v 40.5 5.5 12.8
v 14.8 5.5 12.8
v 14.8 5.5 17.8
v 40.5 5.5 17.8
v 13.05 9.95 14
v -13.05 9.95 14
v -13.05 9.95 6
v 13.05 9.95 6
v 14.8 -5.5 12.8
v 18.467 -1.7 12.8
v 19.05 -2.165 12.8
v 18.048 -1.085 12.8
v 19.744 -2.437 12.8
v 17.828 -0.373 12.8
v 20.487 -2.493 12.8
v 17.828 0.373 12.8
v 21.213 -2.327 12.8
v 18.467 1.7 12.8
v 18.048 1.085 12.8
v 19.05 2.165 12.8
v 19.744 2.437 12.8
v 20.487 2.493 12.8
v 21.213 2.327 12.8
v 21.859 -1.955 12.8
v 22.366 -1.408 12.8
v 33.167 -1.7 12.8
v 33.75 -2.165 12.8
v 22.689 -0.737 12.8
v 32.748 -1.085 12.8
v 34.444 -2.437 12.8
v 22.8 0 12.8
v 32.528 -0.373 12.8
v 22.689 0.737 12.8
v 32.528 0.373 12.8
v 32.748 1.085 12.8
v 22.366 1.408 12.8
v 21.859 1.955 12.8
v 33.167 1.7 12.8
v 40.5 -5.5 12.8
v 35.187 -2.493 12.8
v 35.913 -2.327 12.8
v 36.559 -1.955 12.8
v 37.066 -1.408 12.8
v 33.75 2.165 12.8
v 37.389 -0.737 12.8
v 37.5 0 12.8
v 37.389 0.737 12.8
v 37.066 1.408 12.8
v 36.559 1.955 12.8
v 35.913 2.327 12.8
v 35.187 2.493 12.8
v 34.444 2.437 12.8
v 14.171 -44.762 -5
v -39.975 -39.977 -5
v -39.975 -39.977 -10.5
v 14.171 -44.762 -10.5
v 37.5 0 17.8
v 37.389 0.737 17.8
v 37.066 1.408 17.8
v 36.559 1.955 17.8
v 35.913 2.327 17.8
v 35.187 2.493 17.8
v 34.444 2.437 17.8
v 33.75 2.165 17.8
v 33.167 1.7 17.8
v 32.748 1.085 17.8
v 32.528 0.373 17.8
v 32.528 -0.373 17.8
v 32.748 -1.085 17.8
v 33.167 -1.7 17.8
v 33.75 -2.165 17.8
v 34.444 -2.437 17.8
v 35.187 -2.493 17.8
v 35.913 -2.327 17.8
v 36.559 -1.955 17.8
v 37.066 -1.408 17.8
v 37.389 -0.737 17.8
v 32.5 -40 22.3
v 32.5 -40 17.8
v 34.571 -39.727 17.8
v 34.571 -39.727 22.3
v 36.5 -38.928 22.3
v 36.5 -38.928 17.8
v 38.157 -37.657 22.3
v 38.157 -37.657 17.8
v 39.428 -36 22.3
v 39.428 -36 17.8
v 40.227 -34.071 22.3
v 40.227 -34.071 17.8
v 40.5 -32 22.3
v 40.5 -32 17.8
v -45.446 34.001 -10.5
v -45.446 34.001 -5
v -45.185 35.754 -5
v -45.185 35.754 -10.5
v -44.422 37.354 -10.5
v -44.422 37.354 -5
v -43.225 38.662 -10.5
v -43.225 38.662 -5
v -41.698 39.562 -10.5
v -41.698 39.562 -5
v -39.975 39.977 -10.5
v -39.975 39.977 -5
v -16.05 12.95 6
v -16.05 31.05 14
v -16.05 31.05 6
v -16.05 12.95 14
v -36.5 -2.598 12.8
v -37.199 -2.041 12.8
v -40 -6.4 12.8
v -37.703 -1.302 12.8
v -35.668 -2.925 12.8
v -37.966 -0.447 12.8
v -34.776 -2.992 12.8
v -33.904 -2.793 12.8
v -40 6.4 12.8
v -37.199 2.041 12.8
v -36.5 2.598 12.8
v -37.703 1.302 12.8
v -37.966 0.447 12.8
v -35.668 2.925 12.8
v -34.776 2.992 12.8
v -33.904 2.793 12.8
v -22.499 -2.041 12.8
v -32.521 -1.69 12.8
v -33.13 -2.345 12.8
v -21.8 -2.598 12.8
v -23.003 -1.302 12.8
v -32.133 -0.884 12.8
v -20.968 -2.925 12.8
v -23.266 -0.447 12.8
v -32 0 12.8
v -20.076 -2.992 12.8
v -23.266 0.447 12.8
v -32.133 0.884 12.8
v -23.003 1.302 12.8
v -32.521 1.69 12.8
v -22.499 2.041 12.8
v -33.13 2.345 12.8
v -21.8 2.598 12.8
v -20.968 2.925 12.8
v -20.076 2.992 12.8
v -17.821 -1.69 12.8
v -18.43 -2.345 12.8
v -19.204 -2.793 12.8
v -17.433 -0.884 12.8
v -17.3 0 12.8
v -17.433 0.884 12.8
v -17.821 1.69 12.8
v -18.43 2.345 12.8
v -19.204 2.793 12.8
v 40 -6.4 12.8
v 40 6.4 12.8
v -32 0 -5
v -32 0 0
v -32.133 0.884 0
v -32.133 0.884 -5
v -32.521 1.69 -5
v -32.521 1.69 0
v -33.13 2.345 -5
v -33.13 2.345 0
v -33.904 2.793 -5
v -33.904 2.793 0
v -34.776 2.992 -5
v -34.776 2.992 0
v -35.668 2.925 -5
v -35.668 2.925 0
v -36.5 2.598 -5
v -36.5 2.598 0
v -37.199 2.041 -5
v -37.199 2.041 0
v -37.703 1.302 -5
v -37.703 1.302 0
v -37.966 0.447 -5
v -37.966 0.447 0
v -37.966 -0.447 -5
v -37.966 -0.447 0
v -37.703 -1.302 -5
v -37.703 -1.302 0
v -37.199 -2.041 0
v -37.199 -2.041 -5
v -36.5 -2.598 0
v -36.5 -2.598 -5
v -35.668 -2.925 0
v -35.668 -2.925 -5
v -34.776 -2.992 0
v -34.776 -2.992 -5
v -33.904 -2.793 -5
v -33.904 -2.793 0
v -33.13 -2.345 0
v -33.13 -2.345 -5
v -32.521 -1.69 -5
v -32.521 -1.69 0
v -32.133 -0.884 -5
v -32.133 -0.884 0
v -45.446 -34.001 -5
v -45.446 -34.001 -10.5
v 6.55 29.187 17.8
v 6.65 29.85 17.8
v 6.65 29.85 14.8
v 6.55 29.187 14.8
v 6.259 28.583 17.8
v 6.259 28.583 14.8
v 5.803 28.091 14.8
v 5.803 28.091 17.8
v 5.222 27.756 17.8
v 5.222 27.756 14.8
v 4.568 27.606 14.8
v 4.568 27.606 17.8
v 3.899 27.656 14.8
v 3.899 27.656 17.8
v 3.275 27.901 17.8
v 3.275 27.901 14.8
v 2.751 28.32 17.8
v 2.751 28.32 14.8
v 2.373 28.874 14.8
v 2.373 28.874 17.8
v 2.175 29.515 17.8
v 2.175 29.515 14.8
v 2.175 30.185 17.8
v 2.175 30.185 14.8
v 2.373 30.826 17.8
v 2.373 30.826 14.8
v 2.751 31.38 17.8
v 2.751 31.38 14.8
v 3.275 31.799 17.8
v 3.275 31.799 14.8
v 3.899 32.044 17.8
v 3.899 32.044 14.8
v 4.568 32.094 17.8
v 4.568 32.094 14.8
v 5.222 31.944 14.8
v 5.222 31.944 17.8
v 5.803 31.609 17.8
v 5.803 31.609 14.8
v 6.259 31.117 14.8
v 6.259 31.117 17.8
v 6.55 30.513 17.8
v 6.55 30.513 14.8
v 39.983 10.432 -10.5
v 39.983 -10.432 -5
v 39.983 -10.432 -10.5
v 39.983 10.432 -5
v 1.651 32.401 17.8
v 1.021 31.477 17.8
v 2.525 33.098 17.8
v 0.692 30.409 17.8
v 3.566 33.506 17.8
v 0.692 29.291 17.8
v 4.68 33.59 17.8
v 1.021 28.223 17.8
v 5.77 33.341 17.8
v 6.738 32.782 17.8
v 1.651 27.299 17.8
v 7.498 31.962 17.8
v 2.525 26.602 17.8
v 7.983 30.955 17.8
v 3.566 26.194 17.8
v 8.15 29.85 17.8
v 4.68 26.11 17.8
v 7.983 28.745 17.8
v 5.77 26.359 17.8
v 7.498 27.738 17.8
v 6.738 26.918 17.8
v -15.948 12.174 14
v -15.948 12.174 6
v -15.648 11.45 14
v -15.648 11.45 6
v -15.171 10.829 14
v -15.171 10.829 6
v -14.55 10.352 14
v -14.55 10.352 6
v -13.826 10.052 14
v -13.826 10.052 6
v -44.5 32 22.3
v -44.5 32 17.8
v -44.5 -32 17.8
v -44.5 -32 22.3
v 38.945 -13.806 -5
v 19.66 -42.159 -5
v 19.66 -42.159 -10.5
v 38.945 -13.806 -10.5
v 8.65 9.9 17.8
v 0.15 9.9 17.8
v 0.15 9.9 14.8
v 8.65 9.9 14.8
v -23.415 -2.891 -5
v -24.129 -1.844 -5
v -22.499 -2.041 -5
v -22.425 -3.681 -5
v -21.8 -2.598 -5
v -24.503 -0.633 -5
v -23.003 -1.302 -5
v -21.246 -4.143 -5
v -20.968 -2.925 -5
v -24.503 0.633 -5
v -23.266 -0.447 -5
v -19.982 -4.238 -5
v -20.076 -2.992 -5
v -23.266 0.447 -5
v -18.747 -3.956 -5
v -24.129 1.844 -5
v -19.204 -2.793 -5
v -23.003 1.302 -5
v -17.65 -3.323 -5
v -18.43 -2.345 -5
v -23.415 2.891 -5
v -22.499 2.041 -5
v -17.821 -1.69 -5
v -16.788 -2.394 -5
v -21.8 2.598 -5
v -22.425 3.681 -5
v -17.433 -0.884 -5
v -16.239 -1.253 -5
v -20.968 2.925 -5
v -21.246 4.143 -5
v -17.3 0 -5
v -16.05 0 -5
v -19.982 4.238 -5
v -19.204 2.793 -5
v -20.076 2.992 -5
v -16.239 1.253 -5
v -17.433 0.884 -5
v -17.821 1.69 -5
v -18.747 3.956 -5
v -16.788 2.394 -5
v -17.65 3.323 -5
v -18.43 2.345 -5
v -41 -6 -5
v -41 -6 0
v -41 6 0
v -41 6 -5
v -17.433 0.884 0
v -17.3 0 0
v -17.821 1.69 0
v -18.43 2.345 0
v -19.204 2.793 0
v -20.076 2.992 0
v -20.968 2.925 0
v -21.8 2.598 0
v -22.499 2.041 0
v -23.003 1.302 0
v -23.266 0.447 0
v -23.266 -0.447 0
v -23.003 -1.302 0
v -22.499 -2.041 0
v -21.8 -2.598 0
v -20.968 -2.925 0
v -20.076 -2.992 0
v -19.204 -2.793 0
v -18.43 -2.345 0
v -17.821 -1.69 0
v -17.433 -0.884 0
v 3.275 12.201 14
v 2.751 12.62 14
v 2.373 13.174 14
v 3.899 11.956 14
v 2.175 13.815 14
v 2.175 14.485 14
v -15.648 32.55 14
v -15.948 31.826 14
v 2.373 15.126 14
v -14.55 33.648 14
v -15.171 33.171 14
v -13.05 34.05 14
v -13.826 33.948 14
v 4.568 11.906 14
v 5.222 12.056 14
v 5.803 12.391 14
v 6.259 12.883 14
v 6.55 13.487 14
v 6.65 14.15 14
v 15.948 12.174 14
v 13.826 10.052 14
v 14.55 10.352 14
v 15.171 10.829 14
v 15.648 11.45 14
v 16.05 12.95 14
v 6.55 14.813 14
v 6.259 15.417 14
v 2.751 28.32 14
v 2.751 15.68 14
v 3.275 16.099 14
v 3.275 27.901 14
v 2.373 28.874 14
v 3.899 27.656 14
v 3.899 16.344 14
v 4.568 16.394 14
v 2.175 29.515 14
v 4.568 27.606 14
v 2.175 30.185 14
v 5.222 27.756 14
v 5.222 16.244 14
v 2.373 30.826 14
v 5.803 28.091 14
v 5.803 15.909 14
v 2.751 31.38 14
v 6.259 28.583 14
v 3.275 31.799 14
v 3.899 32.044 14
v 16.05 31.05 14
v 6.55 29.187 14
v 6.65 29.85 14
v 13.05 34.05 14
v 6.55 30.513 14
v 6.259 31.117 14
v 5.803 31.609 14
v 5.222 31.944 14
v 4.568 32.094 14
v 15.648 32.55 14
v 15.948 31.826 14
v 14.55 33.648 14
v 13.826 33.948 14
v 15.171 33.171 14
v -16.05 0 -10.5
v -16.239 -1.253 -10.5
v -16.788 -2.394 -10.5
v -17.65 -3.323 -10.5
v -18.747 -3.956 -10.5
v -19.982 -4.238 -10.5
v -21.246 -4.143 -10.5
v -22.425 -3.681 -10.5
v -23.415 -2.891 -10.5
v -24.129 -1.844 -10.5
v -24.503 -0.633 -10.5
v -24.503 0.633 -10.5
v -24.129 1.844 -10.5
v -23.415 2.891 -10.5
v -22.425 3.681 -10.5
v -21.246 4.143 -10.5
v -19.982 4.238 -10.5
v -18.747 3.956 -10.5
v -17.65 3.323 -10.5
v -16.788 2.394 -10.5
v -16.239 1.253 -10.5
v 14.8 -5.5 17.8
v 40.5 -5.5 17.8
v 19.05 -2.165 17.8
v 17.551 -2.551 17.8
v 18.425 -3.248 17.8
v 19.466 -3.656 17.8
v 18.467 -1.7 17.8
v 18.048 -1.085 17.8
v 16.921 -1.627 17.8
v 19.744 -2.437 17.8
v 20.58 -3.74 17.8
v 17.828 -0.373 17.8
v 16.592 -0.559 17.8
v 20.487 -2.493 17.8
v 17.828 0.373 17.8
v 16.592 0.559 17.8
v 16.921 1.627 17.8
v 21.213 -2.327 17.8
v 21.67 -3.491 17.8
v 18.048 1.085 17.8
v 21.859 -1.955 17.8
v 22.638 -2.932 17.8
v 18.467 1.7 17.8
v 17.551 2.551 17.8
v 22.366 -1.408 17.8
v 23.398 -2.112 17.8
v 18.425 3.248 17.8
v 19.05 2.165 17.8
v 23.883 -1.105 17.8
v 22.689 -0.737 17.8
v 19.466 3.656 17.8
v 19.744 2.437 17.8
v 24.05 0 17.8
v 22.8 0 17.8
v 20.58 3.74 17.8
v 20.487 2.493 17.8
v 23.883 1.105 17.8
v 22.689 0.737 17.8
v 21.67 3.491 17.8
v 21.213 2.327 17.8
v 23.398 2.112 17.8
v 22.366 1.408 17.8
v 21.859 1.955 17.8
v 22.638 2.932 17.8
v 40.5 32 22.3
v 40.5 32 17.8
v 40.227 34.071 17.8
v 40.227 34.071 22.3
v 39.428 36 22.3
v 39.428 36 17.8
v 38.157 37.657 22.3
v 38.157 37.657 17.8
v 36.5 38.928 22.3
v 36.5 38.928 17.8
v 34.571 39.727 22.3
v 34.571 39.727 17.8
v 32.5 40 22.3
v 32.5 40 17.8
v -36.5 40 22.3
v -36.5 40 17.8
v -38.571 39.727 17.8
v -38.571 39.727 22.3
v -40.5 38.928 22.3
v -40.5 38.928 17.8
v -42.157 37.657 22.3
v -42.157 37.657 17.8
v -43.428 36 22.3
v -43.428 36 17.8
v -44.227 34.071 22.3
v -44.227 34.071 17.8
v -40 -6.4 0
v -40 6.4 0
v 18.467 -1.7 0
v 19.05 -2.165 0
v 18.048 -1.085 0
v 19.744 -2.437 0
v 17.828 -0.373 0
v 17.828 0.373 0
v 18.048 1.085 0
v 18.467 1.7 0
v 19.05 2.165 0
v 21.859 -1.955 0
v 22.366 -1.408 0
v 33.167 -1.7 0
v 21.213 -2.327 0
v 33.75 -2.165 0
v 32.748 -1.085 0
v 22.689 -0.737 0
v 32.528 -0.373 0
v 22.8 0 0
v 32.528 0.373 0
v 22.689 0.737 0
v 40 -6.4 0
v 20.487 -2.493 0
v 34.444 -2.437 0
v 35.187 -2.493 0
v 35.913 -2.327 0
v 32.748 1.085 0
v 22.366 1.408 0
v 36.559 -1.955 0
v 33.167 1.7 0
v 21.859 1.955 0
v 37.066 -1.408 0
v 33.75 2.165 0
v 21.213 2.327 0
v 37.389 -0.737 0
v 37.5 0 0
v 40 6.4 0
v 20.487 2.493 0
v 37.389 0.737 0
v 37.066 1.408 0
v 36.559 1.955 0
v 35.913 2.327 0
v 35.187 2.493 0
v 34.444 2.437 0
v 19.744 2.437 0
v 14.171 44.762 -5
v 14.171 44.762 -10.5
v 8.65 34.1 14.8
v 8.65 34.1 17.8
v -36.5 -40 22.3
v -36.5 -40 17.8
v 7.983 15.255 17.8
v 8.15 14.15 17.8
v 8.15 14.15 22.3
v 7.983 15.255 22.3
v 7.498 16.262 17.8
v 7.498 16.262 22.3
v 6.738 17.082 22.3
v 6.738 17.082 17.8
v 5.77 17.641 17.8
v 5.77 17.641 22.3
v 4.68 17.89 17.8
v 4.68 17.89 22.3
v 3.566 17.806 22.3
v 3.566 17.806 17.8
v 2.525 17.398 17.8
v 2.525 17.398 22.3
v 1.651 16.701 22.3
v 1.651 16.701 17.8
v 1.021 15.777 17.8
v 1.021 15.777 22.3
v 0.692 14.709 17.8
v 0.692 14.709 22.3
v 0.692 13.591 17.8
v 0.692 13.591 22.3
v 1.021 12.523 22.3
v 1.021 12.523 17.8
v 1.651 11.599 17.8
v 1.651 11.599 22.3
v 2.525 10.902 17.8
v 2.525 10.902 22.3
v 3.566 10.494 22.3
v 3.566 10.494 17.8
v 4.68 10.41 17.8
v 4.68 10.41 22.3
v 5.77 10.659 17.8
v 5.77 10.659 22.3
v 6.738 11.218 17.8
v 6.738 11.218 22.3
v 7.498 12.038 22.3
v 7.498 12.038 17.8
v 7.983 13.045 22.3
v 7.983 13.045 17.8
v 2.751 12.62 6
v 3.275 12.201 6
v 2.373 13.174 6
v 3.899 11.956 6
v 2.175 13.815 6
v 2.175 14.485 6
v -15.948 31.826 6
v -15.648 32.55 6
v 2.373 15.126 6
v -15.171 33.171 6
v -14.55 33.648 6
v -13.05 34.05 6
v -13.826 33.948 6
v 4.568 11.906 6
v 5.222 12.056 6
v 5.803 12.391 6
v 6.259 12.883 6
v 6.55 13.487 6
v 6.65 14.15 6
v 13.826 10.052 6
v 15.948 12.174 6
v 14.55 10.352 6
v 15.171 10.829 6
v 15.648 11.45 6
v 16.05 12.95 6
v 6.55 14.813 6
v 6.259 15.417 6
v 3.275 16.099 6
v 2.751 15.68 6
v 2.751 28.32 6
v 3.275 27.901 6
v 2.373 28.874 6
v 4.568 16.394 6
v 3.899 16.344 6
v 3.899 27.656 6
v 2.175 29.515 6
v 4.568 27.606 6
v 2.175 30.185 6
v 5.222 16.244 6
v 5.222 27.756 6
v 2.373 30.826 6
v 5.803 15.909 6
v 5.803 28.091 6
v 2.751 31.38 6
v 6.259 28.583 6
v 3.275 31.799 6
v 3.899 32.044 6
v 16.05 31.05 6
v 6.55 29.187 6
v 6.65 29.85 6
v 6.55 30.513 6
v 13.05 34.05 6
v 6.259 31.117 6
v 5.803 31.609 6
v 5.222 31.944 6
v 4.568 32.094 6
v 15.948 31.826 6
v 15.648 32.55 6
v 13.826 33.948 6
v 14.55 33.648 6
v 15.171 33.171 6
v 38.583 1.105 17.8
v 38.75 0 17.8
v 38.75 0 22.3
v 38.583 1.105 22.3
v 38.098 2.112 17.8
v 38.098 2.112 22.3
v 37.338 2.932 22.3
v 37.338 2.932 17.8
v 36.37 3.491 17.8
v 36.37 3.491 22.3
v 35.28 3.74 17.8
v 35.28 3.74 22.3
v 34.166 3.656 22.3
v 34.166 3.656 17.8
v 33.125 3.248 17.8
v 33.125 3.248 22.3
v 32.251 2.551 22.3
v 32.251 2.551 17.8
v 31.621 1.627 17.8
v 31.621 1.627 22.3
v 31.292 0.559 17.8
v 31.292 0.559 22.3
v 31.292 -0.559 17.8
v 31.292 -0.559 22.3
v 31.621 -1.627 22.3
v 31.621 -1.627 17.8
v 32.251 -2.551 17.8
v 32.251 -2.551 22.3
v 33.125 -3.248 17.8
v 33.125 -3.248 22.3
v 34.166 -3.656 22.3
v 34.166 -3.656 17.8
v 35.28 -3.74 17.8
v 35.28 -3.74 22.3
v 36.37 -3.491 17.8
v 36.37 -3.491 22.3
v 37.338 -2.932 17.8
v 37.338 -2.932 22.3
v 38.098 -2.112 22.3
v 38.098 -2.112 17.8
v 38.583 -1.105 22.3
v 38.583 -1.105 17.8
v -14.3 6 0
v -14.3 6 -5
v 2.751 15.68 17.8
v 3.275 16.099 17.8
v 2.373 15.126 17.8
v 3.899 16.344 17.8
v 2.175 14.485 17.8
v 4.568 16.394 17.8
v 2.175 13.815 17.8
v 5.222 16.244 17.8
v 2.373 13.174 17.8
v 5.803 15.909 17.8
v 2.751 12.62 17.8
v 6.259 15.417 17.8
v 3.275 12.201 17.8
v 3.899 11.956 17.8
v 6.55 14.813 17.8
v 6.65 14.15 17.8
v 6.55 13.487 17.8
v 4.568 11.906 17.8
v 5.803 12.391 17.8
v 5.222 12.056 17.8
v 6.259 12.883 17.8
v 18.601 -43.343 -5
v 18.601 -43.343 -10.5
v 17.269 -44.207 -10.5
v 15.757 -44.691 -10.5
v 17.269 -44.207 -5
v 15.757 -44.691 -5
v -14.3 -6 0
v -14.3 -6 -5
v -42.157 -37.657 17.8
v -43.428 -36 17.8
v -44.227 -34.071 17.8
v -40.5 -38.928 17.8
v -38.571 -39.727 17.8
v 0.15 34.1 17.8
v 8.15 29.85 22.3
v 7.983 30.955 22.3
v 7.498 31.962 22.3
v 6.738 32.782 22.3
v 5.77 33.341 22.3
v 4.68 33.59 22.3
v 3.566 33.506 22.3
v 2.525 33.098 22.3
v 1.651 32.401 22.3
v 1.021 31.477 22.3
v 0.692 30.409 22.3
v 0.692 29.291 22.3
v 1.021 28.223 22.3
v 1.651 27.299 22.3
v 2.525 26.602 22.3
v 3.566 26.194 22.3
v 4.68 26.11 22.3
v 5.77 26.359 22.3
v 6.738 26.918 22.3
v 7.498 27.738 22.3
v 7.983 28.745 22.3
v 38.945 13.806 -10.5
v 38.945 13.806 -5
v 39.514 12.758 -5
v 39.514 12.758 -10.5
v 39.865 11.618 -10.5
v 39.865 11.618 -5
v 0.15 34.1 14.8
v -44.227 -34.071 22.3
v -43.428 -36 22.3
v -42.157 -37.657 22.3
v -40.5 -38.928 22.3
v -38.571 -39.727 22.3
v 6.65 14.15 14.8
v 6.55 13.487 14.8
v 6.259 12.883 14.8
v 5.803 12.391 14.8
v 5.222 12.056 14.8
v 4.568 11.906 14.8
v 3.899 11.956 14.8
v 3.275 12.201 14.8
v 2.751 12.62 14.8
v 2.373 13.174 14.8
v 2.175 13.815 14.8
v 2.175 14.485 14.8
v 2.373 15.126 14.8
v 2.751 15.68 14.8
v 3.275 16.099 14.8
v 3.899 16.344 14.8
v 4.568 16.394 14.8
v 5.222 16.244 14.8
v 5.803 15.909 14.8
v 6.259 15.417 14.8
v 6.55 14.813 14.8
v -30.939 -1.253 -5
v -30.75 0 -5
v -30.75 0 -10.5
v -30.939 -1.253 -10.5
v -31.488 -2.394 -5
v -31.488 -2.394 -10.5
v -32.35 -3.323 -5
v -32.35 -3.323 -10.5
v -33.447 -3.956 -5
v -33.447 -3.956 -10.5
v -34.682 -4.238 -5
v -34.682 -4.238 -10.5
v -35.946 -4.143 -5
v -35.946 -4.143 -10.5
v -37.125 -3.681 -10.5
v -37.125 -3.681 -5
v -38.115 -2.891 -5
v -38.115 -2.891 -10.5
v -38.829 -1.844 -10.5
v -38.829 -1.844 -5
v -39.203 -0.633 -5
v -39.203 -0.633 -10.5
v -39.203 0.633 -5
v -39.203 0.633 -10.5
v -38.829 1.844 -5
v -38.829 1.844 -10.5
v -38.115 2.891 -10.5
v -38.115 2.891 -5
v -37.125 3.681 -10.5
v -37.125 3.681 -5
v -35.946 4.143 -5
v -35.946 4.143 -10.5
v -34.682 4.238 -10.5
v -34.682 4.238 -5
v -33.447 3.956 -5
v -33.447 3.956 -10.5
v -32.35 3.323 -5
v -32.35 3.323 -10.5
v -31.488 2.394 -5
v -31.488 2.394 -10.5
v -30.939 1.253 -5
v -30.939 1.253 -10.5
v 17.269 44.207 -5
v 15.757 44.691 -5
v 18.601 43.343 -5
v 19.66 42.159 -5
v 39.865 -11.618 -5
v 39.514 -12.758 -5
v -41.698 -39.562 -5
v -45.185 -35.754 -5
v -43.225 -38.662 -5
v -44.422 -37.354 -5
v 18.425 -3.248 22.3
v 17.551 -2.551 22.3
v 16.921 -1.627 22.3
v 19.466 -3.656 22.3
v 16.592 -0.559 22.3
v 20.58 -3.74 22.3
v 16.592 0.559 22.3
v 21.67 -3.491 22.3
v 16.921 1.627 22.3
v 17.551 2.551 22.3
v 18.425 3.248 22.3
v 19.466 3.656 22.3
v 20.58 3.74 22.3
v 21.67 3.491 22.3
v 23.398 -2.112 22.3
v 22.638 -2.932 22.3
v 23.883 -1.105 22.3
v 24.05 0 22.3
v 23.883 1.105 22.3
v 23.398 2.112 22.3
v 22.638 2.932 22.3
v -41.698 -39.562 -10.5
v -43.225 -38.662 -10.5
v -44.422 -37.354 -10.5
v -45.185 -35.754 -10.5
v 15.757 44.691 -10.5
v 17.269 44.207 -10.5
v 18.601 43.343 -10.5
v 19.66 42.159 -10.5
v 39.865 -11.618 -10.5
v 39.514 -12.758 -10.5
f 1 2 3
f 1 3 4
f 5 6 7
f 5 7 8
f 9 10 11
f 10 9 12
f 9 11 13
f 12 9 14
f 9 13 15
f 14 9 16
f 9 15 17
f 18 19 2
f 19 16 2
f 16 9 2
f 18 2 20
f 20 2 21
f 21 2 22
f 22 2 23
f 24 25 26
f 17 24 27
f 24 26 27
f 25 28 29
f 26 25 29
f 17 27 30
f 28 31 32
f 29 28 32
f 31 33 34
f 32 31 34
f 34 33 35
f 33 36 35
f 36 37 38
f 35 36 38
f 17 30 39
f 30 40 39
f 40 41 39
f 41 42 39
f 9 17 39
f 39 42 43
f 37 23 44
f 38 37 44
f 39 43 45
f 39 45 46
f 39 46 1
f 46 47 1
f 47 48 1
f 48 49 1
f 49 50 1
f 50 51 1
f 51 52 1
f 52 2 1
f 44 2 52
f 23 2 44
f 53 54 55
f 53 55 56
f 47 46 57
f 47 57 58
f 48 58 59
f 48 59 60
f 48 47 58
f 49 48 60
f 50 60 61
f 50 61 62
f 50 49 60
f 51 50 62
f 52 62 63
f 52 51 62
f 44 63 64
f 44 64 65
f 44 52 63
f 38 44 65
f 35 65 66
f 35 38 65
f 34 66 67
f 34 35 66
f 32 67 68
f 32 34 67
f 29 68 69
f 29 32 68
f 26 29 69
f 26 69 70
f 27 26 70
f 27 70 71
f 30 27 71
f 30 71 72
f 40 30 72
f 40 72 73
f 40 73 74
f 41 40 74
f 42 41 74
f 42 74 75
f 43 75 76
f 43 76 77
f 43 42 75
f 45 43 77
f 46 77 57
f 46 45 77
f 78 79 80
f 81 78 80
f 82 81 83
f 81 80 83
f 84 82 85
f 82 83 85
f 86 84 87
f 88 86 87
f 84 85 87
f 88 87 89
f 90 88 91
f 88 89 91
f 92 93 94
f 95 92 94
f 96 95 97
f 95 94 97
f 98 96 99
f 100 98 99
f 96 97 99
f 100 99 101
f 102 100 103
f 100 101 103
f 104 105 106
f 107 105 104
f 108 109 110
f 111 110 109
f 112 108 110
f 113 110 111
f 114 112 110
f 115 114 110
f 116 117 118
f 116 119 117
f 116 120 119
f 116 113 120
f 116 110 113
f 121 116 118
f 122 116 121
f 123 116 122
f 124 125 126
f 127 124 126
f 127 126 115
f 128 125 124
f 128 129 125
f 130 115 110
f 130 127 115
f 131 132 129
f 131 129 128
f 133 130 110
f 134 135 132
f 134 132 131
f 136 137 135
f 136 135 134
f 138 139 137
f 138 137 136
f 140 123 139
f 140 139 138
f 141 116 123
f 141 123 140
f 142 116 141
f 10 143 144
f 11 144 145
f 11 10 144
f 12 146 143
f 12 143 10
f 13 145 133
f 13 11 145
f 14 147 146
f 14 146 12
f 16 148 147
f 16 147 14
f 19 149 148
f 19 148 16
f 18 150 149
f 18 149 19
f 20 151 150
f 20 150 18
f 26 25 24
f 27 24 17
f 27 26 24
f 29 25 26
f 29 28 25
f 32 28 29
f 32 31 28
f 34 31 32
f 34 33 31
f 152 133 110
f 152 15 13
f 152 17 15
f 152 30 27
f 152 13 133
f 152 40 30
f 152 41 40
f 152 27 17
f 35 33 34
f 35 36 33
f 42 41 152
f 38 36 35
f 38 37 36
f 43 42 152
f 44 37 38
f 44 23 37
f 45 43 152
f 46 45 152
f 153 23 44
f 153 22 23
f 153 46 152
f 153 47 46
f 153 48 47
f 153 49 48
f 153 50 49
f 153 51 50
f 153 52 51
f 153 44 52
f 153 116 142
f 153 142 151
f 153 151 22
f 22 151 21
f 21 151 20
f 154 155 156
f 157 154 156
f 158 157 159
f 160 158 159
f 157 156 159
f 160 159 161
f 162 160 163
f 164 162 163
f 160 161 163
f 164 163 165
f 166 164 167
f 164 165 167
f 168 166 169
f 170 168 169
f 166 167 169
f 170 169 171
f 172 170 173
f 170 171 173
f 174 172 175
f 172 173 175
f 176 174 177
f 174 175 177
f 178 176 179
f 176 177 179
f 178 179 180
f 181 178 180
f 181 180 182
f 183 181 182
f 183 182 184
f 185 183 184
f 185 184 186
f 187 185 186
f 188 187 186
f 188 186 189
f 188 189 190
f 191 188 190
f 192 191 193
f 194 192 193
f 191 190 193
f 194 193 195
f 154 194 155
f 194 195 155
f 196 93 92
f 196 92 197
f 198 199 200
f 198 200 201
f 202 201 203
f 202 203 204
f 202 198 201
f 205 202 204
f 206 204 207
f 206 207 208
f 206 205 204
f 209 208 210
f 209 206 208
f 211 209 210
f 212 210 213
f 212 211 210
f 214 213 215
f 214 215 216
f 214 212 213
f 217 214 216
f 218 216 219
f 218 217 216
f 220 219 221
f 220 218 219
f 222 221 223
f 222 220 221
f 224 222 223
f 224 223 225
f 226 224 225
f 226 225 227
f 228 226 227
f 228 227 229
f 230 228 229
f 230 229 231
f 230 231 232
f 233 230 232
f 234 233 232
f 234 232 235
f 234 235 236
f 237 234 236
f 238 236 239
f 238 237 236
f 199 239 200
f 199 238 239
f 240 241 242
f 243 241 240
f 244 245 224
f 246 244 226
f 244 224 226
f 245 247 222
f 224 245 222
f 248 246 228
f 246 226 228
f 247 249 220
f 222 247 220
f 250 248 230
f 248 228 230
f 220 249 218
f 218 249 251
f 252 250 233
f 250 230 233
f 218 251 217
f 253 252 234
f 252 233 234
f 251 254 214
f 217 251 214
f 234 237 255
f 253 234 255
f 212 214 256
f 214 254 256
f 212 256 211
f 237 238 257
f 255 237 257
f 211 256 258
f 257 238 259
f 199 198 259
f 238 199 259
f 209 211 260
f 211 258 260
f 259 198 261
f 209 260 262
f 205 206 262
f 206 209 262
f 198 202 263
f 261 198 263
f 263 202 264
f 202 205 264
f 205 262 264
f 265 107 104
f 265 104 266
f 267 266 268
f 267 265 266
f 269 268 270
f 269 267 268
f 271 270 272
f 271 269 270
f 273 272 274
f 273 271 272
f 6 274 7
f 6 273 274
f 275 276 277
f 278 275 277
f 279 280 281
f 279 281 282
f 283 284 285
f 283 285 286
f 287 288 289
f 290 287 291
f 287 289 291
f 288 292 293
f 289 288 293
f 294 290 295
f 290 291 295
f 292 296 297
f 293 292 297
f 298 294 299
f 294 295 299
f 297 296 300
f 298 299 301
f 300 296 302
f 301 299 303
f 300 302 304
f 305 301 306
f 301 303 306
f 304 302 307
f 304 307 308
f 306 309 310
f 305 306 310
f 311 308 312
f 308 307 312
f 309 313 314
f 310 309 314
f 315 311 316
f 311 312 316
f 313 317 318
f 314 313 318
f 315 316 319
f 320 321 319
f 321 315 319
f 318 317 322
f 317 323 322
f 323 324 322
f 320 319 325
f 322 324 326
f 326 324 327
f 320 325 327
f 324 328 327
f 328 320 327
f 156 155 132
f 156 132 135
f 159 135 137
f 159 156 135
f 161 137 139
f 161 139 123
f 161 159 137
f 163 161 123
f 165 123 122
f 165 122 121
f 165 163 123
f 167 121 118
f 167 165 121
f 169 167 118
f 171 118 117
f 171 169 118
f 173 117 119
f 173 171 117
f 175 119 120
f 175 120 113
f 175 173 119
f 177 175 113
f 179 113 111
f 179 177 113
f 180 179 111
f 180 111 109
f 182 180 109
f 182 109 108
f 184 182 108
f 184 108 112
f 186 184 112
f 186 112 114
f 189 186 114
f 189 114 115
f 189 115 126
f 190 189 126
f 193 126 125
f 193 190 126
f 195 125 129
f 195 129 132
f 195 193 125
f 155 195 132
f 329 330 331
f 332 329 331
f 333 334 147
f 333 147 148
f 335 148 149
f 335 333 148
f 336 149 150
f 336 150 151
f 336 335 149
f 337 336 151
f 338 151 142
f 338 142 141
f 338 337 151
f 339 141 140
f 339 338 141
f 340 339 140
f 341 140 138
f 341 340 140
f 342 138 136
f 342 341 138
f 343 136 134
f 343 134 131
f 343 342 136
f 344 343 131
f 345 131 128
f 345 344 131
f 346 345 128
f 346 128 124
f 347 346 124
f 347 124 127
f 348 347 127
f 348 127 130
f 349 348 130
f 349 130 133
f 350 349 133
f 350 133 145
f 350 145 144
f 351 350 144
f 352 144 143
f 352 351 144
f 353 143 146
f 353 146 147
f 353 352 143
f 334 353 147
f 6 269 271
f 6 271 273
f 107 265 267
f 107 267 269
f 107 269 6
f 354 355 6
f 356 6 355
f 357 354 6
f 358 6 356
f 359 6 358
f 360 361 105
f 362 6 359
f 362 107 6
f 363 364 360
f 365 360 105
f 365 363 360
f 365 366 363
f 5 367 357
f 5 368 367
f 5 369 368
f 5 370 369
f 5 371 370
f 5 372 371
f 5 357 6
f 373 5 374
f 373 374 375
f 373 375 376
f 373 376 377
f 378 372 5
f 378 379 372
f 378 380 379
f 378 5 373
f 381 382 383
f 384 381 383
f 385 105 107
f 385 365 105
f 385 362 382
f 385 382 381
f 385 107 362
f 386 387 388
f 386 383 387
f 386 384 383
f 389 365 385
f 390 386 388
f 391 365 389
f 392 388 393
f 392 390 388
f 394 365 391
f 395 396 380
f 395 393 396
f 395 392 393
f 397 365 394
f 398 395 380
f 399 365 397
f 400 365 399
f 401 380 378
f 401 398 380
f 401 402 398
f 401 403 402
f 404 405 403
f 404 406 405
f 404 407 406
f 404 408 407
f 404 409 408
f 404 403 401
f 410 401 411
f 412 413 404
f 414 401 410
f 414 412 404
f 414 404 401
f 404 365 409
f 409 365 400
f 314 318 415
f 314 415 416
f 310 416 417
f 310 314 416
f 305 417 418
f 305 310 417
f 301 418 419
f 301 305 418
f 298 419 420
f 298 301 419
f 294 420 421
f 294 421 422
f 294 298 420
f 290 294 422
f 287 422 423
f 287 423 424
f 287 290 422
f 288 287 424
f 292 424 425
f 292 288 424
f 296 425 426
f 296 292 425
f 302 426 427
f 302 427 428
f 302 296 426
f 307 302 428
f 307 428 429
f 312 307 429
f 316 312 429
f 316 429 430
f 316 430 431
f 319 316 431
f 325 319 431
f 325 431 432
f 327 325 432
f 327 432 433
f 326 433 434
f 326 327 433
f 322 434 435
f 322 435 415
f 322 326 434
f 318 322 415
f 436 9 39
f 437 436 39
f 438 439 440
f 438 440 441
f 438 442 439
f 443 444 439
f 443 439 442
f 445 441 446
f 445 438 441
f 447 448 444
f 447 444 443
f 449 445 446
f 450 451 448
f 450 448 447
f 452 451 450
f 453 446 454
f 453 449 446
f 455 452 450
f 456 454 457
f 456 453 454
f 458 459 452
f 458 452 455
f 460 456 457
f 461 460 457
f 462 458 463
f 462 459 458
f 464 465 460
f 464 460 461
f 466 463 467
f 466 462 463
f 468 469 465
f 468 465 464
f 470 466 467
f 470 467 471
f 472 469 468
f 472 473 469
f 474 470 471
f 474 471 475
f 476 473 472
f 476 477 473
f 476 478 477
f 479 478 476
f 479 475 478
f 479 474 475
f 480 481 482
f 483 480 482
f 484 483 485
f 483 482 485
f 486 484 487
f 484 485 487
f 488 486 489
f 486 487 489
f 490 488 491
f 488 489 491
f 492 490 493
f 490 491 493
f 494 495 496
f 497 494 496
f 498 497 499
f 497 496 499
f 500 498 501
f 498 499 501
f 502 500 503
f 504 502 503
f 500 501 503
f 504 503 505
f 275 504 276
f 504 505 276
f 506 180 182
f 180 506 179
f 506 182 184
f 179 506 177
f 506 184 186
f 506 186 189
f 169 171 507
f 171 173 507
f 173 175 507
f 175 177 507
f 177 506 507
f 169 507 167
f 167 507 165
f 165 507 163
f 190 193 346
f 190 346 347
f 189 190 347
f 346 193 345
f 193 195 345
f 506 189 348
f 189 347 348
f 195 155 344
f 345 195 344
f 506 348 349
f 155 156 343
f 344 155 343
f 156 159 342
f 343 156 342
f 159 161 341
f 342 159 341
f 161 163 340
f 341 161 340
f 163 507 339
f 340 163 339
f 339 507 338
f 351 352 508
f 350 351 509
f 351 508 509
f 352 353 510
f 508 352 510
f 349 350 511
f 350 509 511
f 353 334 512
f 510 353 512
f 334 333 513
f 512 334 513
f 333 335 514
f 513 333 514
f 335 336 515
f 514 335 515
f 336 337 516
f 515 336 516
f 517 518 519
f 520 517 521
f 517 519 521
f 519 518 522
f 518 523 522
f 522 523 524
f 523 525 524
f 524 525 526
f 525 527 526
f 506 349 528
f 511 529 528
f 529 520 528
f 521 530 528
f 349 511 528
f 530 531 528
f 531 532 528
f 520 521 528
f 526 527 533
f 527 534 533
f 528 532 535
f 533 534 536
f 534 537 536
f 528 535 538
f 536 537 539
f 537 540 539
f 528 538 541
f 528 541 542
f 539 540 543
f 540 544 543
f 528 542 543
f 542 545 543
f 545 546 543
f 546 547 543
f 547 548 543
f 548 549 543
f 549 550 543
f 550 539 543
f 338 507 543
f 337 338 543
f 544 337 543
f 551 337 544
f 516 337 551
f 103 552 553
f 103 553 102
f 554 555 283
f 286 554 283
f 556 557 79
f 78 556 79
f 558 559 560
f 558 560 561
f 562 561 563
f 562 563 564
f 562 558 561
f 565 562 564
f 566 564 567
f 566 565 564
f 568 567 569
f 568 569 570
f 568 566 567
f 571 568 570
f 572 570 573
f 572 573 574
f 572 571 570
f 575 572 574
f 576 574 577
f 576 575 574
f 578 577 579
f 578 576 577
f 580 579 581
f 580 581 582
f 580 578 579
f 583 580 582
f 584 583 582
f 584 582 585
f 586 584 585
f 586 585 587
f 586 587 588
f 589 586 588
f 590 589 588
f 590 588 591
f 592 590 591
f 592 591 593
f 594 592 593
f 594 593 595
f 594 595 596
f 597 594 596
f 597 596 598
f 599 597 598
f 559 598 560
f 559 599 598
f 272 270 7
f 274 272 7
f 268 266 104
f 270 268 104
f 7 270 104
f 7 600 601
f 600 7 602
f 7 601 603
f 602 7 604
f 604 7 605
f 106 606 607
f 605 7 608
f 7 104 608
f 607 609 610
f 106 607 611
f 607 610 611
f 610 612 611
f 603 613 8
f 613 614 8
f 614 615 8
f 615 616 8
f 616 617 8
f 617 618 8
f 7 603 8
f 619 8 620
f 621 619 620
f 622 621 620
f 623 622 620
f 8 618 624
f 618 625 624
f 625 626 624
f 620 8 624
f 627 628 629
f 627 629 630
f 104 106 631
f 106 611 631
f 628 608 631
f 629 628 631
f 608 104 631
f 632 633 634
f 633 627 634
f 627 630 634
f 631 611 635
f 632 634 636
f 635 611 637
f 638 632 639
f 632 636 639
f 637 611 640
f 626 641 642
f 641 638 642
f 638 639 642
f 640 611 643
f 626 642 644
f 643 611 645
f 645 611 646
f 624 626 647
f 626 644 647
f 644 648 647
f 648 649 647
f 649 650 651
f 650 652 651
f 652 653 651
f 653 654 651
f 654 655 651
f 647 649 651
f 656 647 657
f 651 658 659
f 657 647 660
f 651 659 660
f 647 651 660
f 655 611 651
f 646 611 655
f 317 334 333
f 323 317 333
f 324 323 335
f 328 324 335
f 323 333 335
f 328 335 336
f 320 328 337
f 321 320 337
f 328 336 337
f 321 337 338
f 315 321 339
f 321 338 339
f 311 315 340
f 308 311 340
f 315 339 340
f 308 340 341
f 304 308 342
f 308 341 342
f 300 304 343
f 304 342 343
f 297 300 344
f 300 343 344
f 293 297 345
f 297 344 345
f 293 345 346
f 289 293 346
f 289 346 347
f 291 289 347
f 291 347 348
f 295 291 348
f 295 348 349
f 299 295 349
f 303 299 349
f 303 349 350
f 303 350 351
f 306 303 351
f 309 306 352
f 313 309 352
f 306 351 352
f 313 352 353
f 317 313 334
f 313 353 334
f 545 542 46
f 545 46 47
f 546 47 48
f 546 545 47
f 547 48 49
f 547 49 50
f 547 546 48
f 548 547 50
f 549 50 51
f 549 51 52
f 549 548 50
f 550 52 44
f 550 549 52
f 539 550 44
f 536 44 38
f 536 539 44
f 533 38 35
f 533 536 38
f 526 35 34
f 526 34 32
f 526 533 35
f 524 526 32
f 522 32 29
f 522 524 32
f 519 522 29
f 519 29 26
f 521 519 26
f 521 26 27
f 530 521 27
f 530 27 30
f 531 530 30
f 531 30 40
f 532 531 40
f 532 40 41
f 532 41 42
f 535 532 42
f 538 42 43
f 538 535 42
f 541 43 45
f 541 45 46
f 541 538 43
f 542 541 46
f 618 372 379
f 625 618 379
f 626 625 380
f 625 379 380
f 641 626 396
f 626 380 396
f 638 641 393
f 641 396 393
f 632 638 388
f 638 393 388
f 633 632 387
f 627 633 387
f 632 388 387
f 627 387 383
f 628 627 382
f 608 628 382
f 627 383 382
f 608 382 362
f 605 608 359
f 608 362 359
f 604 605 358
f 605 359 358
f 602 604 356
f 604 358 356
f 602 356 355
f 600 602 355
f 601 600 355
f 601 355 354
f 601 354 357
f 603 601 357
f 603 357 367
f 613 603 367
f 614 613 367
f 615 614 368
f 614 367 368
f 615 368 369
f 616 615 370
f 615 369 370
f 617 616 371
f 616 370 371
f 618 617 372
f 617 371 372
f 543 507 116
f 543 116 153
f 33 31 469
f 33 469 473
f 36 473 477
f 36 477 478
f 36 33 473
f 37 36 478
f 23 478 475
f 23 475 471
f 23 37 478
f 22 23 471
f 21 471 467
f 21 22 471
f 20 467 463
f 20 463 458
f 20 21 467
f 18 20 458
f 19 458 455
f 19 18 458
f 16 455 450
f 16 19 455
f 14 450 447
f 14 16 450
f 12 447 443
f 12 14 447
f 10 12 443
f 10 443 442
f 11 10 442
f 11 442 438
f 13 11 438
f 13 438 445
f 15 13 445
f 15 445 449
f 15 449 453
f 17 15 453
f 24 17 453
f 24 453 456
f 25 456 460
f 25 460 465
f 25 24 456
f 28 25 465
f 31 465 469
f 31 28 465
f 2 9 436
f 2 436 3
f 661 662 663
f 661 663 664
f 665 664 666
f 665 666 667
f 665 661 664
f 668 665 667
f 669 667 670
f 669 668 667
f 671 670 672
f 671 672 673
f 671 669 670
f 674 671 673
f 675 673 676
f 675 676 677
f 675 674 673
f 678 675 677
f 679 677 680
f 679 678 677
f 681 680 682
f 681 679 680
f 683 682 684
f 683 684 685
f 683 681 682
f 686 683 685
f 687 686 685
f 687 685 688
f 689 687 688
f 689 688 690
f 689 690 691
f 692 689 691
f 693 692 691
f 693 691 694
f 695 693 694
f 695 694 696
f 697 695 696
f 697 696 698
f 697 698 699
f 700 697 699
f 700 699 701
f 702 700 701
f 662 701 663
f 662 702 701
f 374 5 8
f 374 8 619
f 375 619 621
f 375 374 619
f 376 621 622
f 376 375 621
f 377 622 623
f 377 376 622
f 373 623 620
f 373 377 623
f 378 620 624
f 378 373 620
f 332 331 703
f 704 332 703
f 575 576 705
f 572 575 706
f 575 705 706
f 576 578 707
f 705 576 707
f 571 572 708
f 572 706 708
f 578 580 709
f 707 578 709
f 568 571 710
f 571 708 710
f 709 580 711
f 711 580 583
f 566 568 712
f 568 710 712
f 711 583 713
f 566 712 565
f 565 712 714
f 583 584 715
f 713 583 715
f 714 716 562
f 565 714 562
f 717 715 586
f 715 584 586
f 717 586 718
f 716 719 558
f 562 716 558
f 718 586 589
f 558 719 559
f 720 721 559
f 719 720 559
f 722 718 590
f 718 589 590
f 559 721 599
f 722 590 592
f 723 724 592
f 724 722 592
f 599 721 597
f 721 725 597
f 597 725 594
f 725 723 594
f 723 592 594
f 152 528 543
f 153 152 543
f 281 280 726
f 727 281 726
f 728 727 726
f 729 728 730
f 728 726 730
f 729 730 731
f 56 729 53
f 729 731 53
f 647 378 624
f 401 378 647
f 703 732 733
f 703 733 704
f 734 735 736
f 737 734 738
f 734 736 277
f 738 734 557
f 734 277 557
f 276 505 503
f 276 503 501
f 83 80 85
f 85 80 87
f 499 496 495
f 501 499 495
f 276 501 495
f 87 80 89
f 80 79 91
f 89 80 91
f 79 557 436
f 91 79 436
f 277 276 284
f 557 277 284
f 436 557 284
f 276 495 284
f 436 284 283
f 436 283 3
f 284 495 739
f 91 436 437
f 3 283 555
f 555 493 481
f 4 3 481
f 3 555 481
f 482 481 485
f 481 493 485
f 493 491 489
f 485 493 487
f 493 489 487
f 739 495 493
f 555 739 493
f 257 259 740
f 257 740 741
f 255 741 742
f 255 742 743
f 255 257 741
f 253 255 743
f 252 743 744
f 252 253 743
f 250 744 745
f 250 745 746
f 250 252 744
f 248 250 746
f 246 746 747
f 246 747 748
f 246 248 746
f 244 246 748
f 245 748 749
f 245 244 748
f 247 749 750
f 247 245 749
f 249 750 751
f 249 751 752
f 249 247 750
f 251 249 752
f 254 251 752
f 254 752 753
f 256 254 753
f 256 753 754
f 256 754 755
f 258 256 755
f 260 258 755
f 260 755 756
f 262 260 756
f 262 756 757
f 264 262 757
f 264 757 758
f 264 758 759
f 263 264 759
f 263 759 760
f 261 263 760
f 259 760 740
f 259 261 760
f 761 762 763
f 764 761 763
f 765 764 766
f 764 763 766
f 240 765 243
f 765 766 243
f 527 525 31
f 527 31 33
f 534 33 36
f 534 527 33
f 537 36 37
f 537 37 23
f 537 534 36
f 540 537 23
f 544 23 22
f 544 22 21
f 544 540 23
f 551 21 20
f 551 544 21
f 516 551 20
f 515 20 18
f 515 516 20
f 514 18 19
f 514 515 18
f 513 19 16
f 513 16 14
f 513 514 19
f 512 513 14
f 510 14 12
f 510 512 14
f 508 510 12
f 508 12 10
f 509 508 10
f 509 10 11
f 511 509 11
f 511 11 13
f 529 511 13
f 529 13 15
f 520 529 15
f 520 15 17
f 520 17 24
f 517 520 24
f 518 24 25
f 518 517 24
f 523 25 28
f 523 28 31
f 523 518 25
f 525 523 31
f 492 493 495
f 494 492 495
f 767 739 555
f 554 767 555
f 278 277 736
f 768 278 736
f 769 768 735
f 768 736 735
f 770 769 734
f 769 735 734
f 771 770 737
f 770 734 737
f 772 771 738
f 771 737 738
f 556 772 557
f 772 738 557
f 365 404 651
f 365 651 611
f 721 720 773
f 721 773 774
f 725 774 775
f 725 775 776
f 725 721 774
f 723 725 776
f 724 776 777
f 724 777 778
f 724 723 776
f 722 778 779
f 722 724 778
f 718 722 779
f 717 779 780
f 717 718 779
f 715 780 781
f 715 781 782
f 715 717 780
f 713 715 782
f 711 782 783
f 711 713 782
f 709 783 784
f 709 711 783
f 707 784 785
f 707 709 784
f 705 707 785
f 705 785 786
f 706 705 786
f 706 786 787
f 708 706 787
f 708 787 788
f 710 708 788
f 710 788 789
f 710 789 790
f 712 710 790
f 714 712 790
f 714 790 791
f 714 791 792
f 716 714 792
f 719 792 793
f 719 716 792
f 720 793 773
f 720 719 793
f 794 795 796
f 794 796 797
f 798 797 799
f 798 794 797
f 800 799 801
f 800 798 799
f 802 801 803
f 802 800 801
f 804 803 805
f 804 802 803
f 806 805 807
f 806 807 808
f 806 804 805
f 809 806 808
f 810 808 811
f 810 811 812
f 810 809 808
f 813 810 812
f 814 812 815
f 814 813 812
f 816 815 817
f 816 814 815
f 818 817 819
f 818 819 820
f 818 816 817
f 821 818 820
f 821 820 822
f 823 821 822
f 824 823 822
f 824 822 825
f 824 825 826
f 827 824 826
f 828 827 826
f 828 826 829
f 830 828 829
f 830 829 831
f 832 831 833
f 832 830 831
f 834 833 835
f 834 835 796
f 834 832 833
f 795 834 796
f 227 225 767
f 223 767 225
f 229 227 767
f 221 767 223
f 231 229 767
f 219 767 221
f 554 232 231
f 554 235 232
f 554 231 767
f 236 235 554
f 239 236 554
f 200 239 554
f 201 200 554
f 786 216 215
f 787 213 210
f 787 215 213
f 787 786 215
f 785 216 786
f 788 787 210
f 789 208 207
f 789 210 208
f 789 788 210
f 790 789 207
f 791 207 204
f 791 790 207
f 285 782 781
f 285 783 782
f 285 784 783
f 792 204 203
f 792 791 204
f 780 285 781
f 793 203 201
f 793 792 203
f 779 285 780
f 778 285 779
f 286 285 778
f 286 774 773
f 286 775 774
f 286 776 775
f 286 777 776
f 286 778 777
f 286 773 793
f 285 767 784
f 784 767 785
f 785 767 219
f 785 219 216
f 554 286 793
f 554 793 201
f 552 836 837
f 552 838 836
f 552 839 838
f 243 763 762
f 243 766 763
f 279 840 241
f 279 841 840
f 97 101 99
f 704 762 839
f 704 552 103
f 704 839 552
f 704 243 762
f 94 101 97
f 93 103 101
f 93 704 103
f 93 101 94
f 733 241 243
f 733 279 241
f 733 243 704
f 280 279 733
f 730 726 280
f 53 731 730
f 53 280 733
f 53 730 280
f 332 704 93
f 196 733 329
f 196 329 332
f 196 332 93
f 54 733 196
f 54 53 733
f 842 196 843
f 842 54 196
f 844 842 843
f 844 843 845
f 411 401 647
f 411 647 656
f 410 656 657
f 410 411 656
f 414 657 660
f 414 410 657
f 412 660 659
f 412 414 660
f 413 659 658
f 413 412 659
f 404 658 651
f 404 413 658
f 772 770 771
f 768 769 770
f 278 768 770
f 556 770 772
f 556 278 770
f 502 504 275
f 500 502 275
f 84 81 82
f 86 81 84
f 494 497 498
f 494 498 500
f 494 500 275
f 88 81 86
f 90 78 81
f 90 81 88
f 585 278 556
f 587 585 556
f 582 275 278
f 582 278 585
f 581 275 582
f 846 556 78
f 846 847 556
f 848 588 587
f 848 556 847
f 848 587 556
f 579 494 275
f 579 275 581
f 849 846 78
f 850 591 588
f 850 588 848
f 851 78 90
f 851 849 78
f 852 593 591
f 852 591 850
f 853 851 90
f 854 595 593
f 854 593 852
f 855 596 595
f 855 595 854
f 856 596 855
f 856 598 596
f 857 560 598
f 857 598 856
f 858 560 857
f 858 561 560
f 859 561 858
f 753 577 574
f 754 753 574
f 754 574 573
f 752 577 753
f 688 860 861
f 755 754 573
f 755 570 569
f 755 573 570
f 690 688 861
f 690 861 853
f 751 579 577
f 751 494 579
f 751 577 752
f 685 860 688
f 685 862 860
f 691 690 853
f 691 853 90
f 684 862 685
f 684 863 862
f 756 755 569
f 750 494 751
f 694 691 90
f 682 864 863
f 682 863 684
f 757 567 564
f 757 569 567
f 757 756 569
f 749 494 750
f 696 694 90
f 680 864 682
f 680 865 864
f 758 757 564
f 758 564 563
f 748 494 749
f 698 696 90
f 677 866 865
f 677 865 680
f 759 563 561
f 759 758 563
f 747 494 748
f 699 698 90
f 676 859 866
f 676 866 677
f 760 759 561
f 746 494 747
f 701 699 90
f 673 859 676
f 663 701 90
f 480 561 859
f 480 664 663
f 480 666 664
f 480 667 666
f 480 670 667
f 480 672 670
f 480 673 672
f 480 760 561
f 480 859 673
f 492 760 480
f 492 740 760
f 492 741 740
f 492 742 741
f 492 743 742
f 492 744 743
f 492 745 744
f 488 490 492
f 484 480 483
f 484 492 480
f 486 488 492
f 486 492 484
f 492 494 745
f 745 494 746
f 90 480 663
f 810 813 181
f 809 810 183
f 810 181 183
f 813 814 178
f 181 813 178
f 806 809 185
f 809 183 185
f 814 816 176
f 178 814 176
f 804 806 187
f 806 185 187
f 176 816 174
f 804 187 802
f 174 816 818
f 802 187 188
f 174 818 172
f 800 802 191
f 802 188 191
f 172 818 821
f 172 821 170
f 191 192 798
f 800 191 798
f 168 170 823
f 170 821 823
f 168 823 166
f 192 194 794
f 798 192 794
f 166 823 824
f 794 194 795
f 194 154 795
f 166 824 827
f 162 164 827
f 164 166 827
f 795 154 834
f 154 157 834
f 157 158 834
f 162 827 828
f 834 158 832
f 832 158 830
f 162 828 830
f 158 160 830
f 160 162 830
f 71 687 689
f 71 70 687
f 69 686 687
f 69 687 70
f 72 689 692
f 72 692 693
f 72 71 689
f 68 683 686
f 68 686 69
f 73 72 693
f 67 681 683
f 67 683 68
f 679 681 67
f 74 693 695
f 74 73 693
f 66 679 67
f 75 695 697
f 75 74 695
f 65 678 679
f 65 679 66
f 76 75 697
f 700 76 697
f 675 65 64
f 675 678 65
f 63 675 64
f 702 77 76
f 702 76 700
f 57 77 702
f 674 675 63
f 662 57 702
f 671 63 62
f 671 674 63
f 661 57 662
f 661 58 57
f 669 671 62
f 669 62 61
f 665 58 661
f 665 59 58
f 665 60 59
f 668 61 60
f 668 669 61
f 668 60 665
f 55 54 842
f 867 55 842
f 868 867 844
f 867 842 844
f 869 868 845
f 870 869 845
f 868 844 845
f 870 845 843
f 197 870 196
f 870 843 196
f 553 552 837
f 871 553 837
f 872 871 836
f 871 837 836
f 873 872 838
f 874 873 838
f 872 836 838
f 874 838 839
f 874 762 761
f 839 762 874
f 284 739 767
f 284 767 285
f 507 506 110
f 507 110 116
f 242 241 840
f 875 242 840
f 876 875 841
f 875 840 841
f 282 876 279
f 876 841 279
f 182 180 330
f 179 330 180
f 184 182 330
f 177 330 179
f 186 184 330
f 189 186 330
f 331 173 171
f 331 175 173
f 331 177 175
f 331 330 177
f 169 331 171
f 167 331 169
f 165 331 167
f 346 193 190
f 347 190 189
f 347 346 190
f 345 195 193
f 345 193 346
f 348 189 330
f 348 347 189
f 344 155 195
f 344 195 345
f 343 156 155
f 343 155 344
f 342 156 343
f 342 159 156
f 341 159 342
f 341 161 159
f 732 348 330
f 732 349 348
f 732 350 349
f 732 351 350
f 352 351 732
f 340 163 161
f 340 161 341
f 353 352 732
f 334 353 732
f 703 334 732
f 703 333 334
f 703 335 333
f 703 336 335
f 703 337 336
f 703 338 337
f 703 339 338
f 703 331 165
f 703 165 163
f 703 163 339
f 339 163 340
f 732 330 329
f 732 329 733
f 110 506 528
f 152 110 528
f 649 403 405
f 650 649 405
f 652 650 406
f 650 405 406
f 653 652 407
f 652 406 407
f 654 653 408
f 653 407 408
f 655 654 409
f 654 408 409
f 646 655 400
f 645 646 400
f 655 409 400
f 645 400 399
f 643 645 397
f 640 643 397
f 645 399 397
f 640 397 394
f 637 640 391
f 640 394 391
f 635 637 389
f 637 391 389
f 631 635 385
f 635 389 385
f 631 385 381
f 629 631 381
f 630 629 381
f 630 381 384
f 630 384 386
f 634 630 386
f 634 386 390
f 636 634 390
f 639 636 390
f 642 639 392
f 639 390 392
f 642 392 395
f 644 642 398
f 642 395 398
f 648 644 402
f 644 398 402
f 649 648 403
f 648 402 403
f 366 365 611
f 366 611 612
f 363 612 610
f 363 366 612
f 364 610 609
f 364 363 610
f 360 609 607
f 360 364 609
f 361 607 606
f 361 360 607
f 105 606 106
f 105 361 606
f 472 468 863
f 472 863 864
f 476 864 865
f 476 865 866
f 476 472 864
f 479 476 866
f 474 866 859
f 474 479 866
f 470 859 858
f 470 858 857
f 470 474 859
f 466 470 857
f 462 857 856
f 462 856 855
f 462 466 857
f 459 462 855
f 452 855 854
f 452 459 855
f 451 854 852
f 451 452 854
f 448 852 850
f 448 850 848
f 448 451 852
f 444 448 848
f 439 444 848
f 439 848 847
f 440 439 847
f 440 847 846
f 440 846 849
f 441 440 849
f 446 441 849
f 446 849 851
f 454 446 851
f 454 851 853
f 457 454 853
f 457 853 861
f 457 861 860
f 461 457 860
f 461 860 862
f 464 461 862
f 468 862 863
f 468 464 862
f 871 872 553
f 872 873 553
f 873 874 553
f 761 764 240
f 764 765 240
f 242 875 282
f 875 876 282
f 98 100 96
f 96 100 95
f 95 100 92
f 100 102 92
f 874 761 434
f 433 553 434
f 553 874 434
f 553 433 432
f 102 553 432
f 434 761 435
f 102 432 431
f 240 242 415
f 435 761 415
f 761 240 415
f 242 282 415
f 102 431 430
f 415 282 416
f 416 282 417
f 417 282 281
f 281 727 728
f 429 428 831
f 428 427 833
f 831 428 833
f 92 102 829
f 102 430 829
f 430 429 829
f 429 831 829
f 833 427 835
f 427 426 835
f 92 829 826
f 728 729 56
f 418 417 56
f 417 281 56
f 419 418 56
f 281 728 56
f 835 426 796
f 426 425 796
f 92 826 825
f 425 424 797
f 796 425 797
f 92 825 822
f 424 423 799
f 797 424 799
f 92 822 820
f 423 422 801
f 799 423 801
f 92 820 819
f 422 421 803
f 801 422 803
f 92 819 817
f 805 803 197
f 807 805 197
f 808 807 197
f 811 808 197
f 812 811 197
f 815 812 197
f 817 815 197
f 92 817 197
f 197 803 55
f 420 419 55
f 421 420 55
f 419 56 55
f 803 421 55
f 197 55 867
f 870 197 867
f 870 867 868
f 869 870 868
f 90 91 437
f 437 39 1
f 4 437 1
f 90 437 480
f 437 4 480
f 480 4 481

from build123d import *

# Parameters (mm, degrees)
SKETCH_W     = 80
SKETCH_H     = 12.8
SKETCH_R     = 3
SKETCH_R_2   = 2.5
PAD_DEPTH    = 12.8
SKETCH001_W  = 26.7
SKETCH001_H  = 12
SKETCH001_R  = 3
PAD001_DEPTH = 5
SKETCH002_R  = 4.25
PAD002_DEPTH = 5.5
SKETCH003_W  = 25.7
SKETCH003_H  = 11
SKETCH003_R  = 2.5
PAD003_DEPTH = 5
SKETCH004_R  = 3.75
PAD004_DEPTH = 4.5
SKETCH006_W  = 8.5
SKETCH006_H  = 24.2
SKETCH006_R  = 2.25
PAD006_DEPTH = 3
SKETCH005_R  = 2.25
PAD005_DEPTH = 8


with BuildPart() as load_cell:
    # Sketch → Pad (new body)
    with BuildSketch(Plane.XY):
        Rectangle(SKETCH_W, SKETCH_H)
        with Locations((-35, 0)):
            Circle(SKETCH_R, mode=Mode.SUBTRACT)
        with Locations((-20.3, 0)):
            Circle(SKETCH_R, mode=Mode.SUBTRACT)
        with Locations((20.3, 0)):
            Circle(SKETCH_R_2, mode=Mode.SUBTRACT)
        with Locations((35, 0)):
            Circle(SKETCH_R_2, mode=Mode.SUBTRACT)
    extrude(amount=PAD_DEPTH)


with BuildPart() as bottom:
    # Sketch001 → Pad001 (new body)
    with BuildSketch(Plane.XY):
        with Locations((-27.65, 0)):
            Rectangle(SKETCH001_W, SKETCH001_H)
        with Locations((-35, 0)):
            Circle(SKETCH001_R, mode=Mode.SUBTRACT)
        with Locations((-20.3, 0)):
            Circle(SKETCH001_R, mode=Mode.SUBTRACT)
    extrude(amount=-PAD001_DEPTH)

    # Sketch002 (on Face8 of Pad001) → Pad002 (join)
    with BuildSketch(Plane(origin=(0, 0, -5), x_dir=(1, 0, 0), z_dir=(0, 0, -1))):
        with BuildLine():
            Line((-39.974556, 39.977453), (14.170835, 44.761768))
            ThreePointArc((19.660164, 42.159409), (17.269194, 44.20666), (14.170835, 44.761768))
            Line((19.660164, 42.159409), (38.944614, 13.805993))
            ThreePointArc((39.98339, 10.431639), (39.717819, 12.196952), (38.944614, 13.805993))
            Line((39.98339, 10.431639), (39.98339, -10.431639))
            ThreePointArc((38.944614, -13.805993), (39.717819, -12.196952), (39.98339, -10.431639))
            Line((38.944614, -13.805993), (19.660164, -42.159409))
            ThreePointArc((14.170835, -44.761768), (17.269194, -44.20666), (19.660164, -42.159409))
            Line((14.170835, -44.761768), (-39.974556, -39.977453))
            ThreePointArc((-45.44645, -34.00074), (-43.871867, -38.052367), (-39.974556, -39.977453))
            Line((-45.44645, -34.00074), (-45.44645, 34.00074))
            ThreePointArc((-39.974556, 39.977453), (-43.871867, 38.052367), (-45.44645, 34.00074))
        make_face()
        with Locations((-35, 0)):
            Circle(SKETCH002_R, mode=Mode.SUBTRACT)
        with Locations((-20.3, 0)):
            Circle(SKETCH002_R, mode=Mode.SUBTRACT)
    extrude(amount=PAD002_DEPTH)


with BuildPart() as top:
    # Sketch003 (on Face10 of ShapeBinder001) → Pad003 (new body)
    with BuildSketch(Plane.XY.offset(12.8)):
        with Locations((27.65, 0)):
            Rectangle(SKETCH003_W, SKETCH003_H)
        with Locations((35, 0)):
            Circle(SKETCH003_R, mode=Mode.SUBTRACT)
        with Locations((20.3, 0)):
            Circle(SKETCH003_R, mode=Mode.SUBTRACT)
    extrude(amount=PAD003_DEPTH)

    # Sketch004 (on Face8 of Pad003) → Pad004 (join)
    with BuildSketch(Plane.XY.offset(17.8)):
        with BuildLine():
            Line((40.5, 5.5), (40.5, 32))
            ThreePointArc((40.5, 32), (38.156854, 37.656854), (32.5, 40))
            Line((32.5, 40), (-36.5, 40))
            ThreePointArc((-36.5, 40), (-42.156854, 37.656854), (-44.5, 32))
            Line((-44.5, 32), (-44.5, -32))
            ThreePointArc((-44.5, -32), (-42.156854, -37.656854), (-36.5, -40))
            Line((-36.5, -40), (32.5, -40))
            ThreePointArc((32.5, -40), (38.156854, -37.656854), (40.5, -32))
            Line((40.5, -32), (40.5, -5.5))
            Line((40.5, 5.5), (40.5, -5.5))
        make_face()
        with Locations((35, 0)):
            Circle(SKETCH004_R, mode=Mode.SUBTRACT)
        with Locations((20.3, 0)):
            Circle(SKETCH004_R, mode=Mode.SUBTRACT)
        with Locations((4.4, 29.85)):
            Circle(SKETCH004_R, mode=Mode.SUBTRACT)
        with Locations((4.4, 14.15)):
            Circle(SKETCH004_R, mode=Mode.SUBTRACT)
    extrude(amount=PAD004_DEPTH)

    # Sketch006 (on Face5 of Pad004) → Pad006 (join)
    with BuildSketch(Plane(origin=(0, 0, 17.8), x_dir=(1, 0, 0), z_dir=(0, 0, -1))):
        with Locations((4.4, -22)):
            Rectangle(SKETCH006_W, SKETCH006_H)
        with Locations((4.4, -14.15)):
            Circle(SKETCH006_R, mode=Mode.SUBTRACT)
        with Locations((4.4, -29.85)):
            Circle(SKETCH006_R, mode=Mode.SUBTRACT)
    extrude(amount=PAD006_DEPTH)


with BuildPart() as weightunit:
    # Sketch005 → Pad005 (new body)
    with BuildSketch(Plane.XY):
        with BuildLine():
            Line((-13.05, -12.05), (13.05, -12.05))
            ThreePointArc((13.05, -12.05), (15.17132, -11.17132), (16.05, -9.05))
            Line((16.05, -9.05), (16.05, 9.05))
            ThreePointArc((16.05, 9.05), (15.17132, 11.17132), (13.05, 12.05))
            Line((13.05, 12.05), (-13.05, 12.05))
            ThreePointArc((-13.05, 12.05), (-15.17132, 11.17132), (-16.05, 9.05))
            Line((-16.05, 9.05), (-16.05, -9.05))
            ThreePointArc((-16.05, -9.05), (-15.17132, -11.17132), (-13.05, -12.05))
        make_face()
        with Locations((4.4, 7.85)):
            Circle(SKETCH005_R, mode=Mode.SUBTRACT)
        with Locations((4.4, -7.85)):
            Circle(SKETCH005_R, mode=Mode.SUBTRACT)
    extrude(amount=-PAD005_DEPTH)


with BuildPart() as weightunit_1:
    # Body003 placement: moved
    add(weightunit.part.moved(Location((0, 22, 14))))


solid = Compound([load_cell.part, bottom.part, top.part, weightunit_1.part])
